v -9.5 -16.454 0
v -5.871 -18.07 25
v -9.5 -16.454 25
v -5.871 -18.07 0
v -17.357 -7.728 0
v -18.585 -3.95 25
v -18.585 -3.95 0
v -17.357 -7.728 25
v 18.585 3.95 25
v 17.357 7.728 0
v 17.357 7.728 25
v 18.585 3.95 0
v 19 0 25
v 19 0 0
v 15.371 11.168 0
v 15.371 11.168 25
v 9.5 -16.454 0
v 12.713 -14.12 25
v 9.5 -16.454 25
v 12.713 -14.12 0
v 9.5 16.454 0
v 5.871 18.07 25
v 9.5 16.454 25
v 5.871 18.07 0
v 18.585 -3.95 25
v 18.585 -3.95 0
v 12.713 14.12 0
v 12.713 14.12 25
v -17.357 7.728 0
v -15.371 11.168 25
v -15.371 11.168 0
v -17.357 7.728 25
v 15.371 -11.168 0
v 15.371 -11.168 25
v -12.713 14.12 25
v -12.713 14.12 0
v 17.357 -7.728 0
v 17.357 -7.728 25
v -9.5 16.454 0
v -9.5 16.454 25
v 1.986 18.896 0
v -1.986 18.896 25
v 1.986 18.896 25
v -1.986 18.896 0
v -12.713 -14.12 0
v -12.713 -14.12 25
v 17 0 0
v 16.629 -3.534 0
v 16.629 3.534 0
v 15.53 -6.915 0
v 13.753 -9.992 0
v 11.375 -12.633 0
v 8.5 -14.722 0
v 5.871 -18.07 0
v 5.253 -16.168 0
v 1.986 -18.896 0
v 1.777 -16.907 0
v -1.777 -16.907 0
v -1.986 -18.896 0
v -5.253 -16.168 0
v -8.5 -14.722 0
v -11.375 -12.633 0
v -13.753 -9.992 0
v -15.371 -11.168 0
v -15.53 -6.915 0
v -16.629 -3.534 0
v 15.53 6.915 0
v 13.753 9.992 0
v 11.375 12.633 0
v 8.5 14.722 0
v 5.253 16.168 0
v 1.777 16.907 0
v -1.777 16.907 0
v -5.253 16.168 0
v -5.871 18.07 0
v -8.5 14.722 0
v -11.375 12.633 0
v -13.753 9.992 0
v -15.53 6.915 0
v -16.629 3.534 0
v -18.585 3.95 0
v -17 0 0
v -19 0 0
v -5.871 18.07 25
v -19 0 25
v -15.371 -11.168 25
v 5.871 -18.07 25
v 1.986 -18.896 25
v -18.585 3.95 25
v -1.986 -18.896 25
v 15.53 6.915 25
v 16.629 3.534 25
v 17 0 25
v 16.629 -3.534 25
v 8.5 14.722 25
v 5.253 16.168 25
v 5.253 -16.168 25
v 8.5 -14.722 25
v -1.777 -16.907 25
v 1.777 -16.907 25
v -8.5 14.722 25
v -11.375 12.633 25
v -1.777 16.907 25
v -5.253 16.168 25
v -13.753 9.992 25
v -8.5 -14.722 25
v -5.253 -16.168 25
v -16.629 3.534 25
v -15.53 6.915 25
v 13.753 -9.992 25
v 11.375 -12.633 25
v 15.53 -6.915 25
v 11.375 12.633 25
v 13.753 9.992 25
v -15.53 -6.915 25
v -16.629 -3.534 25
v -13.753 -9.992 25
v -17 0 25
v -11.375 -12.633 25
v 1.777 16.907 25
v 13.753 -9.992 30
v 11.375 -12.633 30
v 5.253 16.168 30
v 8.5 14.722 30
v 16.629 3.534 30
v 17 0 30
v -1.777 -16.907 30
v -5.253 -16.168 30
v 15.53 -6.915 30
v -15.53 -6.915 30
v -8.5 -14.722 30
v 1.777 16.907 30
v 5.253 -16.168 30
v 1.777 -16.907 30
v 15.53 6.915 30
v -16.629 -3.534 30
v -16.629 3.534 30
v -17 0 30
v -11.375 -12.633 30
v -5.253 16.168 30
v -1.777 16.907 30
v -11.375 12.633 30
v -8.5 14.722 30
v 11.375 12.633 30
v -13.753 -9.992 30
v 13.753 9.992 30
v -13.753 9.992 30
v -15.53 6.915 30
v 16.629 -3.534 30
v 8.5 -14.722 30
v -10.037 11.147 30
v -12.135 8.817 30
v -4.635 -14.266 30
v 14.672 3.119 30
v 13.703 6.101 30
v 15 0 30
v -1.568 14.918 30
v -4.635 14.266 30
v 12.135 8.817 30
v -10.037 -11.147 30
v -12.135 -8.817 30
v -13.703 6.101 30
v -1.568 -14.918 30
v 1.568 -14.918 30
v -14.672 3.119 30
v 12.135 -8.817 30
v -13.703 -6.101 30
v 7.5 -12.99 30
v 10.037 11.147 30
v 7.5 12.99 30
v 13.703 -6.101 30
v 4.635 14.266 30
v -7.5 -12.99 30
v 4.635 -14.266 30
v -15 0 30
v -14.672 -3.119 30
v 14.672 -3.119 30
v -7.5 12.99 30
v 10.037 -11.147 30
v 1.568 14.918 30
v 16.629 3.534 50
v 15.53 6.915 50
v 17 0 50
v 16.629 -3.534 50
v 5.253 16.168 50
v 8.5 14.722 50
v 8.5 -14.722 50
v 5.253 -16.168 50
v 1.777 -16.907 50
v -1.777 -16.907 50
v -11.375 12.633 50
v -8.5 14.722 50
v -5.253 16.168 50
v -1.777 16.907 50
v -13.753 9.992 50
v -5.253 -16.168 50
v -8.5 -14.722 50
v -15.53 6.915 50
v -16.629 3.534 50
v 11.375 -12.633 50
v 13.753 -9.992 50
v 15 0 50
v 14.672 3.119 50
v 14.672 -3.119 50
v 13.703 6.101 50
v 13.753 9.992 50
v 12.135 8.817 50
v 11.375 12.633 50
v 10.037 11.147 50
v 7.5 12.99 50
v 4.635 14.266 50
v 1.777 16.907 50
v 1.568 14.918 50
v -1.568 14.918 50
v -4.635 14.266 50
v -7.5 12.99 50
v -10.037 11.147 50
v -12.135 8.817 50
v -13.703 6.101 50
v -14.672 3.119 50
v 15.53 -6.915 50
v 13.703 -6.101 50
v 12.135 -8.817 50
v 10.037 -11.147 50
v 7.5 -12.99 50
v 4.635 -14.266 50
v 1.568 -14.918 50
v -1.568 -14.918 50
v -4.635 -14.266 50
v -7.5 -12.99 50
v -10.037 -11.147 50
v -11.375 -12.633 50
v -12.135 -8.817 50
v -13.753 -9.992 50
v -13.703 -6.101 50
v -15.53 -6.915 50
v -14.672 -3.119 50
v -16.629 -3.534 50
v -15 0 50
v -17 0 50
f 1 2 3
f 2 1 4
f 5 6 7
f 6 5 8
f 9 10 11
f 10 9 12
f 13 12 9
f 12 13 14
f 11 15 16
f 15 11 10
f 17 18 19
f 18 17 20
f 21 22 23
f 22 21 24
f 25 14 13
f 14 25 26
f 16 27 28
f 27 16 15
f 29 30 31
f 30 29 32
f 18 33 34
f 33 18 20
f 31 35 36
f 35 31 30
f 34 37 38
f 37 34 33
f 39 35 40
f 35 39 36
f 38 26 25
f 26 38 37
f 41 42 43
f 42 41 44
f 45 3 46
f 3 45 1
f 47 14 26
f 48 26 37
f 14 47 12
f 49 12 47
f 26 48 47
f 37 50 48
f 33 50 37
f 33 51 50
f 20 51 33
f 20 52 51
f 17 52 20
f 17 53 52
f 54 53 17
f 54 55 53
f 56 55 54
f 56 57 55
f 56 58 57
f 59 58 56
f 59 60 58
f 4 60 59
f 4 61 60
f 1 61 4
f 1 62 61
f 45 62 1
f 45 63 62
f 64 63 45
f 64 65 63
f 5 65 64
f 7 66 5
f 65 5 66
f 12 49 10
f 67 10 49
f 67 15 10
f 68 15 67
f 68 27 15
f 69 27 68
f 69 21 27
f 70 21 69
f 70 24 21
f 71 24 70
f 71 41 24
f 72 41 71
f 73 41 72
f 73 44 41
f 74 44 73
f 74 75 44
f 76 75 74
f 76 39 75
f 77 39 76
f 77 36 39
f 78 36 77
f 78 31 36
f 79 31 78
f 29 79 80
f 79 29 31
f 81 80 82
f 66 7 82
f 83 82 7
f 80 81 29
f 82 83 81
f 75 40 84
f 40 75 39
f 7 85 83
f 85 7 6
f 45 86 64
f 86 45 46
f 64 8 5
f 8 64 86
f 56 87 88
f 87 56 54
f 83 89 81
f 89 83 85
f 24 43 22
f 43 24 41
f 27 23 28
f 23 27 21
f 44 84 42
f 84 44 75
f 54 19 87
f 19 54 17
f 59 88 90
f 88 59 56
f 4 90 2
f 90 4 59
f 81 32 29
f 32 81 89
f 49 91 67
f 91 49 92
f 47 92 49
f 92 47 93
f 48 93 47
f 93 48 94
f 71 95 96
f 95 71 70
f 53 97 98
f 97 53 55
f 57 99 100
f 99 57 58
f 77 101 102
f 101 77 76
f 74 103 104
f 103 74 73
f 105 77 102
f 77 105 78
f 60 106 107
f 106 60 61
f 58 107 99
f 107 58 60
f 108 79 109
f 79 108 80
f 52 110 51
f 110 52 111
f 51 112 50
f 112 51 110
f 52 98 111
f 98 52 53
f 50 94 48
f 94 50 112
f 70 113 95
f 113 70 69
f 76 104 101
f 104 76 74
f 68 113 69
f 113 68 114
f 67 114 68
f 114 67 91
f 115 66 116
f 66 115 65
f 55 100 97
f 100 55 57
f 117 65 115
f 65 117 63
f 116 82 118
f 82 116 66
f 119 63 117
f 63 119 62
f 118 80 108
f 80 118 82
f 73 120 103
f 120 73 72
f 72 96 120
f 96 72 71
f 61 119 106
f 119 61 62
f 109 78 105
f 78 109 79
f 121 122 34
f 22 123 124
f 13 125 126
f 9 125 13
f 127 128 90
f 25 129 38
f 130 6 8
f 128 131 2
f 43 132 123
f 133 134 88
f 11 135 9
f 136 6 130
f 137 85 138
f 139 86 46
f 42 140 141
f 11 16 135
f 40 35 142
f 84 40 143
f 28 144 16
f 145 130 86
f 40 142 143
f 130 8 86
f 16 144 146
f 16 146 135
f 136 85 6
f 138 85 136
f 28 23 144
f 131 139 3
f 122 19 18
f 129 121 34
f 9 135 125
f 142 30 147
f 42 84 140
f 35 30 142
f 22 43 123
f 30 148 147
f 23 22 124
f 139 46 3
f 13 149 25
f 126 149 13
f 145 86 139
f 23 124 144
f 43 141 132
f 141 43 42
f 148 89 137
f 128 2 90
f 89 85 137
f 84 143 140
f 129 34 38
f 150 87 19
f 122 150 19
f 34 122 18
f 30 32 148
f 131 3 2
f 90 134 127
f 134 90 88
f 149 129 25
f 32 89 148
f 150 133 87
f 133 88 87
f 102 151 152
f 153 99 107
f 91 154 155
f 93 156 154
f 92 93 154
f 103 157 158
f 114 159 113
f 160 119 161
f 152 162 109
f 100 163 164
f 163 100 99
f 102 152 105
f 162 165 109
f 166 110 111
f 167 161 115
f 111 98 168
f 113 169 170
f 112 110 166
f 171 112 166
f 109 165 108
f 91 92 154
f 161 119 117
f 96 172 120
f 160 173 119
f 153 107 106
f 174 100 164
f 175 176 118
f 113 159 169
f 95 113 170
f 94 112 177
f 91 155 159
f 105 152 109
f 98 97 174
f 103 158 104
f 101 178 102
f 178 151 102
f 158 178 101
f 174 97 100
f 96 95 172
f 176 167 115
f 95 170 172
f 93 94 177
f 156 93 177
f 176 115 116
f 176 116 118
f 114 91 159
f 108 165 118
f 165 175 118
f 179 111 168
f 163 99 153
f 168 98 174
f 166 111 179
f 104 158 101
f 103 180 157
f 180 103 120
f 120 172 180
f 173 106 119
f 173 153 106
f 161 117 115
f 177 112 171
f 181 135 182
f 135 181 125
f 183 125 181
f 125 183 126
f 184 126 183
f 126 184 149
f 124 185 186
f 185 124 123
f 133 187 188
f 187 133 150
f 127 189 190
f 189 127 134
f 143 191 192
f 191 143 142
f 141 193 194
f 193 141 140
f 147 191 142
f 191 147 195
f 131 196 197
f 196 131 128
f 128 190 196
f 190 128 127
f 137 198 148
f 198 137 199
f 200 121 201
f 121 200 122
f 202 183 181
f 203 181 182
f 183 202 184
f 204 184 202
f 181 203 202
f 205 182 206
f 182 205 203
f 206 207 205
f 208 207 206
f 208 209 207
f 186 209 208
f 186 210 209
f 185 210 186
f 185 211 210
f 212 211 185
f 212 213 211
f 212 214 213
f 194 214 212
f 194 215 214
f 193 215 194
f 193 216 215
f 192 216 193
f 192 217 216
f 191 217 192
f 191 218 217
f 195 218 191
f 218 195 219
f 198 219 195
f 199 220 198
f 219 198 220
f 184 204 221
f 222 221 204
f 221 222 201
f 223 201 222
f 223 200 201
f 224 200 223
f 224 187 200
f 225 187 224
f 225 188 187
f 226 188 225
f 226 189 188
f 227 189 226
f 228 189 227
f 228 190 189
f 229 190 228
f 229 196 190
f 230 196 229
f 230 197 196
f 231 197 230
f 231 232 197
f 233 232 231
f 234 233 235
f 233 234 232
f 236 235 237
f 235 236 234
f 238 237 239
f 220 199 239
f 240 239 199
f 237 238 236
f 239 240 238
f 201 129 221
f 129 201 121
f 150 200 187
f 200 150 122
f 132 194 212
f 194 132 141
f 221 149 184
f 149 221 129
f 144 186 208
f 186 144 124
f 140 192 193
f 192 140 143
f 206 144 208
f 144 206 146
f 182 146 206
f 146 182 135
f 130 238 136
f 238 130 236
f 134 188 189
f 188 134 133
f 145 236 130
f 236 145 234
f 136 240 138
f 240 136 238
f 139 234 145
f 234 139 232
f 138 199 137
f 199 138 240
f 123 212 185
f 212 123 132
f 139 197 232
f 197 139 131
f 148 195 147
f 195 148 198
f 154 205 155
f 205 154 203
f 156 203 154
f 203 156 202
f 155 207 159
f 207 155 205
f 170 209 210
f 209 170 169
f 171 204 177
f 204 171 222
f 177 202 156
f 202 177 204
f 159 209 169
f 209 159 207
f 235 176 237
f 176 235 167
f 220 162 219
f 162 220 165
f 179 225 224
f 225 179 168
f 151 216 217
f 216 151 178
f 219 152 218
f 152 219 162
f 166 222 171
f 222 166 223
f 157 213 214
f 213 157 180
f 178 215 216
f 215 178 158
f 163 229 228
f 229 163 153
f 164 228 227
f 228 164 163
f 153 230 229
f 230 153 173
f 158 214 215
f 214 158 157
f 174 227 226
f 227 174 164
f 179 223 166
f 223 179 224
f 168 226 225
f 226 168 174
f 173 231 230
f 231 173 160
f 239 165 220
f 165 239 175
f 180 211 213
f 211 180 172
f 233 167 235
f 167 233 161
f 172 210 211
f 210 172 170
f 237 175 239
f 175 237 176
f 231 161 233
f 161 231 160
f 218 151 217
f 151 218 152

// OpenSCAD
//Parameterised coupling generator
// Glyn Cowles Mar 2013


//Thickness of tube walls 
thickness=2; 
//Outside diameter of bottom tube 
d1=38;   
//Height of bottom tube 
h1=25;   
//Outside diameter of top tube
d2=34;   
//Height of top tube
h2=20;   
//Height of connector section
c_ht=5; 
//
assemble(); 
//-----------------------------------------------------------------------
module tube(d,h) {
rad=d/2;
difference() {
cylinder(h=h,r=rad);
cylinder(h=h,r=rad-thickness);
}
}
//-----------------------------------------------------------------------

module connector(){
difference() {
 cylinder (h=c_ht,r1=d1/2,r2=d2/2);
 cylinder (h=c_ht,r1=d1/2-thickness,r2=d2/2-thickness);
}
}

module assemble() {
union() {
	tube(d1,h1);
	translate([0,0,h1]) connector(); 
	translate([0,0,h1+c_ht])  tube(d2,h2);
	}
};
